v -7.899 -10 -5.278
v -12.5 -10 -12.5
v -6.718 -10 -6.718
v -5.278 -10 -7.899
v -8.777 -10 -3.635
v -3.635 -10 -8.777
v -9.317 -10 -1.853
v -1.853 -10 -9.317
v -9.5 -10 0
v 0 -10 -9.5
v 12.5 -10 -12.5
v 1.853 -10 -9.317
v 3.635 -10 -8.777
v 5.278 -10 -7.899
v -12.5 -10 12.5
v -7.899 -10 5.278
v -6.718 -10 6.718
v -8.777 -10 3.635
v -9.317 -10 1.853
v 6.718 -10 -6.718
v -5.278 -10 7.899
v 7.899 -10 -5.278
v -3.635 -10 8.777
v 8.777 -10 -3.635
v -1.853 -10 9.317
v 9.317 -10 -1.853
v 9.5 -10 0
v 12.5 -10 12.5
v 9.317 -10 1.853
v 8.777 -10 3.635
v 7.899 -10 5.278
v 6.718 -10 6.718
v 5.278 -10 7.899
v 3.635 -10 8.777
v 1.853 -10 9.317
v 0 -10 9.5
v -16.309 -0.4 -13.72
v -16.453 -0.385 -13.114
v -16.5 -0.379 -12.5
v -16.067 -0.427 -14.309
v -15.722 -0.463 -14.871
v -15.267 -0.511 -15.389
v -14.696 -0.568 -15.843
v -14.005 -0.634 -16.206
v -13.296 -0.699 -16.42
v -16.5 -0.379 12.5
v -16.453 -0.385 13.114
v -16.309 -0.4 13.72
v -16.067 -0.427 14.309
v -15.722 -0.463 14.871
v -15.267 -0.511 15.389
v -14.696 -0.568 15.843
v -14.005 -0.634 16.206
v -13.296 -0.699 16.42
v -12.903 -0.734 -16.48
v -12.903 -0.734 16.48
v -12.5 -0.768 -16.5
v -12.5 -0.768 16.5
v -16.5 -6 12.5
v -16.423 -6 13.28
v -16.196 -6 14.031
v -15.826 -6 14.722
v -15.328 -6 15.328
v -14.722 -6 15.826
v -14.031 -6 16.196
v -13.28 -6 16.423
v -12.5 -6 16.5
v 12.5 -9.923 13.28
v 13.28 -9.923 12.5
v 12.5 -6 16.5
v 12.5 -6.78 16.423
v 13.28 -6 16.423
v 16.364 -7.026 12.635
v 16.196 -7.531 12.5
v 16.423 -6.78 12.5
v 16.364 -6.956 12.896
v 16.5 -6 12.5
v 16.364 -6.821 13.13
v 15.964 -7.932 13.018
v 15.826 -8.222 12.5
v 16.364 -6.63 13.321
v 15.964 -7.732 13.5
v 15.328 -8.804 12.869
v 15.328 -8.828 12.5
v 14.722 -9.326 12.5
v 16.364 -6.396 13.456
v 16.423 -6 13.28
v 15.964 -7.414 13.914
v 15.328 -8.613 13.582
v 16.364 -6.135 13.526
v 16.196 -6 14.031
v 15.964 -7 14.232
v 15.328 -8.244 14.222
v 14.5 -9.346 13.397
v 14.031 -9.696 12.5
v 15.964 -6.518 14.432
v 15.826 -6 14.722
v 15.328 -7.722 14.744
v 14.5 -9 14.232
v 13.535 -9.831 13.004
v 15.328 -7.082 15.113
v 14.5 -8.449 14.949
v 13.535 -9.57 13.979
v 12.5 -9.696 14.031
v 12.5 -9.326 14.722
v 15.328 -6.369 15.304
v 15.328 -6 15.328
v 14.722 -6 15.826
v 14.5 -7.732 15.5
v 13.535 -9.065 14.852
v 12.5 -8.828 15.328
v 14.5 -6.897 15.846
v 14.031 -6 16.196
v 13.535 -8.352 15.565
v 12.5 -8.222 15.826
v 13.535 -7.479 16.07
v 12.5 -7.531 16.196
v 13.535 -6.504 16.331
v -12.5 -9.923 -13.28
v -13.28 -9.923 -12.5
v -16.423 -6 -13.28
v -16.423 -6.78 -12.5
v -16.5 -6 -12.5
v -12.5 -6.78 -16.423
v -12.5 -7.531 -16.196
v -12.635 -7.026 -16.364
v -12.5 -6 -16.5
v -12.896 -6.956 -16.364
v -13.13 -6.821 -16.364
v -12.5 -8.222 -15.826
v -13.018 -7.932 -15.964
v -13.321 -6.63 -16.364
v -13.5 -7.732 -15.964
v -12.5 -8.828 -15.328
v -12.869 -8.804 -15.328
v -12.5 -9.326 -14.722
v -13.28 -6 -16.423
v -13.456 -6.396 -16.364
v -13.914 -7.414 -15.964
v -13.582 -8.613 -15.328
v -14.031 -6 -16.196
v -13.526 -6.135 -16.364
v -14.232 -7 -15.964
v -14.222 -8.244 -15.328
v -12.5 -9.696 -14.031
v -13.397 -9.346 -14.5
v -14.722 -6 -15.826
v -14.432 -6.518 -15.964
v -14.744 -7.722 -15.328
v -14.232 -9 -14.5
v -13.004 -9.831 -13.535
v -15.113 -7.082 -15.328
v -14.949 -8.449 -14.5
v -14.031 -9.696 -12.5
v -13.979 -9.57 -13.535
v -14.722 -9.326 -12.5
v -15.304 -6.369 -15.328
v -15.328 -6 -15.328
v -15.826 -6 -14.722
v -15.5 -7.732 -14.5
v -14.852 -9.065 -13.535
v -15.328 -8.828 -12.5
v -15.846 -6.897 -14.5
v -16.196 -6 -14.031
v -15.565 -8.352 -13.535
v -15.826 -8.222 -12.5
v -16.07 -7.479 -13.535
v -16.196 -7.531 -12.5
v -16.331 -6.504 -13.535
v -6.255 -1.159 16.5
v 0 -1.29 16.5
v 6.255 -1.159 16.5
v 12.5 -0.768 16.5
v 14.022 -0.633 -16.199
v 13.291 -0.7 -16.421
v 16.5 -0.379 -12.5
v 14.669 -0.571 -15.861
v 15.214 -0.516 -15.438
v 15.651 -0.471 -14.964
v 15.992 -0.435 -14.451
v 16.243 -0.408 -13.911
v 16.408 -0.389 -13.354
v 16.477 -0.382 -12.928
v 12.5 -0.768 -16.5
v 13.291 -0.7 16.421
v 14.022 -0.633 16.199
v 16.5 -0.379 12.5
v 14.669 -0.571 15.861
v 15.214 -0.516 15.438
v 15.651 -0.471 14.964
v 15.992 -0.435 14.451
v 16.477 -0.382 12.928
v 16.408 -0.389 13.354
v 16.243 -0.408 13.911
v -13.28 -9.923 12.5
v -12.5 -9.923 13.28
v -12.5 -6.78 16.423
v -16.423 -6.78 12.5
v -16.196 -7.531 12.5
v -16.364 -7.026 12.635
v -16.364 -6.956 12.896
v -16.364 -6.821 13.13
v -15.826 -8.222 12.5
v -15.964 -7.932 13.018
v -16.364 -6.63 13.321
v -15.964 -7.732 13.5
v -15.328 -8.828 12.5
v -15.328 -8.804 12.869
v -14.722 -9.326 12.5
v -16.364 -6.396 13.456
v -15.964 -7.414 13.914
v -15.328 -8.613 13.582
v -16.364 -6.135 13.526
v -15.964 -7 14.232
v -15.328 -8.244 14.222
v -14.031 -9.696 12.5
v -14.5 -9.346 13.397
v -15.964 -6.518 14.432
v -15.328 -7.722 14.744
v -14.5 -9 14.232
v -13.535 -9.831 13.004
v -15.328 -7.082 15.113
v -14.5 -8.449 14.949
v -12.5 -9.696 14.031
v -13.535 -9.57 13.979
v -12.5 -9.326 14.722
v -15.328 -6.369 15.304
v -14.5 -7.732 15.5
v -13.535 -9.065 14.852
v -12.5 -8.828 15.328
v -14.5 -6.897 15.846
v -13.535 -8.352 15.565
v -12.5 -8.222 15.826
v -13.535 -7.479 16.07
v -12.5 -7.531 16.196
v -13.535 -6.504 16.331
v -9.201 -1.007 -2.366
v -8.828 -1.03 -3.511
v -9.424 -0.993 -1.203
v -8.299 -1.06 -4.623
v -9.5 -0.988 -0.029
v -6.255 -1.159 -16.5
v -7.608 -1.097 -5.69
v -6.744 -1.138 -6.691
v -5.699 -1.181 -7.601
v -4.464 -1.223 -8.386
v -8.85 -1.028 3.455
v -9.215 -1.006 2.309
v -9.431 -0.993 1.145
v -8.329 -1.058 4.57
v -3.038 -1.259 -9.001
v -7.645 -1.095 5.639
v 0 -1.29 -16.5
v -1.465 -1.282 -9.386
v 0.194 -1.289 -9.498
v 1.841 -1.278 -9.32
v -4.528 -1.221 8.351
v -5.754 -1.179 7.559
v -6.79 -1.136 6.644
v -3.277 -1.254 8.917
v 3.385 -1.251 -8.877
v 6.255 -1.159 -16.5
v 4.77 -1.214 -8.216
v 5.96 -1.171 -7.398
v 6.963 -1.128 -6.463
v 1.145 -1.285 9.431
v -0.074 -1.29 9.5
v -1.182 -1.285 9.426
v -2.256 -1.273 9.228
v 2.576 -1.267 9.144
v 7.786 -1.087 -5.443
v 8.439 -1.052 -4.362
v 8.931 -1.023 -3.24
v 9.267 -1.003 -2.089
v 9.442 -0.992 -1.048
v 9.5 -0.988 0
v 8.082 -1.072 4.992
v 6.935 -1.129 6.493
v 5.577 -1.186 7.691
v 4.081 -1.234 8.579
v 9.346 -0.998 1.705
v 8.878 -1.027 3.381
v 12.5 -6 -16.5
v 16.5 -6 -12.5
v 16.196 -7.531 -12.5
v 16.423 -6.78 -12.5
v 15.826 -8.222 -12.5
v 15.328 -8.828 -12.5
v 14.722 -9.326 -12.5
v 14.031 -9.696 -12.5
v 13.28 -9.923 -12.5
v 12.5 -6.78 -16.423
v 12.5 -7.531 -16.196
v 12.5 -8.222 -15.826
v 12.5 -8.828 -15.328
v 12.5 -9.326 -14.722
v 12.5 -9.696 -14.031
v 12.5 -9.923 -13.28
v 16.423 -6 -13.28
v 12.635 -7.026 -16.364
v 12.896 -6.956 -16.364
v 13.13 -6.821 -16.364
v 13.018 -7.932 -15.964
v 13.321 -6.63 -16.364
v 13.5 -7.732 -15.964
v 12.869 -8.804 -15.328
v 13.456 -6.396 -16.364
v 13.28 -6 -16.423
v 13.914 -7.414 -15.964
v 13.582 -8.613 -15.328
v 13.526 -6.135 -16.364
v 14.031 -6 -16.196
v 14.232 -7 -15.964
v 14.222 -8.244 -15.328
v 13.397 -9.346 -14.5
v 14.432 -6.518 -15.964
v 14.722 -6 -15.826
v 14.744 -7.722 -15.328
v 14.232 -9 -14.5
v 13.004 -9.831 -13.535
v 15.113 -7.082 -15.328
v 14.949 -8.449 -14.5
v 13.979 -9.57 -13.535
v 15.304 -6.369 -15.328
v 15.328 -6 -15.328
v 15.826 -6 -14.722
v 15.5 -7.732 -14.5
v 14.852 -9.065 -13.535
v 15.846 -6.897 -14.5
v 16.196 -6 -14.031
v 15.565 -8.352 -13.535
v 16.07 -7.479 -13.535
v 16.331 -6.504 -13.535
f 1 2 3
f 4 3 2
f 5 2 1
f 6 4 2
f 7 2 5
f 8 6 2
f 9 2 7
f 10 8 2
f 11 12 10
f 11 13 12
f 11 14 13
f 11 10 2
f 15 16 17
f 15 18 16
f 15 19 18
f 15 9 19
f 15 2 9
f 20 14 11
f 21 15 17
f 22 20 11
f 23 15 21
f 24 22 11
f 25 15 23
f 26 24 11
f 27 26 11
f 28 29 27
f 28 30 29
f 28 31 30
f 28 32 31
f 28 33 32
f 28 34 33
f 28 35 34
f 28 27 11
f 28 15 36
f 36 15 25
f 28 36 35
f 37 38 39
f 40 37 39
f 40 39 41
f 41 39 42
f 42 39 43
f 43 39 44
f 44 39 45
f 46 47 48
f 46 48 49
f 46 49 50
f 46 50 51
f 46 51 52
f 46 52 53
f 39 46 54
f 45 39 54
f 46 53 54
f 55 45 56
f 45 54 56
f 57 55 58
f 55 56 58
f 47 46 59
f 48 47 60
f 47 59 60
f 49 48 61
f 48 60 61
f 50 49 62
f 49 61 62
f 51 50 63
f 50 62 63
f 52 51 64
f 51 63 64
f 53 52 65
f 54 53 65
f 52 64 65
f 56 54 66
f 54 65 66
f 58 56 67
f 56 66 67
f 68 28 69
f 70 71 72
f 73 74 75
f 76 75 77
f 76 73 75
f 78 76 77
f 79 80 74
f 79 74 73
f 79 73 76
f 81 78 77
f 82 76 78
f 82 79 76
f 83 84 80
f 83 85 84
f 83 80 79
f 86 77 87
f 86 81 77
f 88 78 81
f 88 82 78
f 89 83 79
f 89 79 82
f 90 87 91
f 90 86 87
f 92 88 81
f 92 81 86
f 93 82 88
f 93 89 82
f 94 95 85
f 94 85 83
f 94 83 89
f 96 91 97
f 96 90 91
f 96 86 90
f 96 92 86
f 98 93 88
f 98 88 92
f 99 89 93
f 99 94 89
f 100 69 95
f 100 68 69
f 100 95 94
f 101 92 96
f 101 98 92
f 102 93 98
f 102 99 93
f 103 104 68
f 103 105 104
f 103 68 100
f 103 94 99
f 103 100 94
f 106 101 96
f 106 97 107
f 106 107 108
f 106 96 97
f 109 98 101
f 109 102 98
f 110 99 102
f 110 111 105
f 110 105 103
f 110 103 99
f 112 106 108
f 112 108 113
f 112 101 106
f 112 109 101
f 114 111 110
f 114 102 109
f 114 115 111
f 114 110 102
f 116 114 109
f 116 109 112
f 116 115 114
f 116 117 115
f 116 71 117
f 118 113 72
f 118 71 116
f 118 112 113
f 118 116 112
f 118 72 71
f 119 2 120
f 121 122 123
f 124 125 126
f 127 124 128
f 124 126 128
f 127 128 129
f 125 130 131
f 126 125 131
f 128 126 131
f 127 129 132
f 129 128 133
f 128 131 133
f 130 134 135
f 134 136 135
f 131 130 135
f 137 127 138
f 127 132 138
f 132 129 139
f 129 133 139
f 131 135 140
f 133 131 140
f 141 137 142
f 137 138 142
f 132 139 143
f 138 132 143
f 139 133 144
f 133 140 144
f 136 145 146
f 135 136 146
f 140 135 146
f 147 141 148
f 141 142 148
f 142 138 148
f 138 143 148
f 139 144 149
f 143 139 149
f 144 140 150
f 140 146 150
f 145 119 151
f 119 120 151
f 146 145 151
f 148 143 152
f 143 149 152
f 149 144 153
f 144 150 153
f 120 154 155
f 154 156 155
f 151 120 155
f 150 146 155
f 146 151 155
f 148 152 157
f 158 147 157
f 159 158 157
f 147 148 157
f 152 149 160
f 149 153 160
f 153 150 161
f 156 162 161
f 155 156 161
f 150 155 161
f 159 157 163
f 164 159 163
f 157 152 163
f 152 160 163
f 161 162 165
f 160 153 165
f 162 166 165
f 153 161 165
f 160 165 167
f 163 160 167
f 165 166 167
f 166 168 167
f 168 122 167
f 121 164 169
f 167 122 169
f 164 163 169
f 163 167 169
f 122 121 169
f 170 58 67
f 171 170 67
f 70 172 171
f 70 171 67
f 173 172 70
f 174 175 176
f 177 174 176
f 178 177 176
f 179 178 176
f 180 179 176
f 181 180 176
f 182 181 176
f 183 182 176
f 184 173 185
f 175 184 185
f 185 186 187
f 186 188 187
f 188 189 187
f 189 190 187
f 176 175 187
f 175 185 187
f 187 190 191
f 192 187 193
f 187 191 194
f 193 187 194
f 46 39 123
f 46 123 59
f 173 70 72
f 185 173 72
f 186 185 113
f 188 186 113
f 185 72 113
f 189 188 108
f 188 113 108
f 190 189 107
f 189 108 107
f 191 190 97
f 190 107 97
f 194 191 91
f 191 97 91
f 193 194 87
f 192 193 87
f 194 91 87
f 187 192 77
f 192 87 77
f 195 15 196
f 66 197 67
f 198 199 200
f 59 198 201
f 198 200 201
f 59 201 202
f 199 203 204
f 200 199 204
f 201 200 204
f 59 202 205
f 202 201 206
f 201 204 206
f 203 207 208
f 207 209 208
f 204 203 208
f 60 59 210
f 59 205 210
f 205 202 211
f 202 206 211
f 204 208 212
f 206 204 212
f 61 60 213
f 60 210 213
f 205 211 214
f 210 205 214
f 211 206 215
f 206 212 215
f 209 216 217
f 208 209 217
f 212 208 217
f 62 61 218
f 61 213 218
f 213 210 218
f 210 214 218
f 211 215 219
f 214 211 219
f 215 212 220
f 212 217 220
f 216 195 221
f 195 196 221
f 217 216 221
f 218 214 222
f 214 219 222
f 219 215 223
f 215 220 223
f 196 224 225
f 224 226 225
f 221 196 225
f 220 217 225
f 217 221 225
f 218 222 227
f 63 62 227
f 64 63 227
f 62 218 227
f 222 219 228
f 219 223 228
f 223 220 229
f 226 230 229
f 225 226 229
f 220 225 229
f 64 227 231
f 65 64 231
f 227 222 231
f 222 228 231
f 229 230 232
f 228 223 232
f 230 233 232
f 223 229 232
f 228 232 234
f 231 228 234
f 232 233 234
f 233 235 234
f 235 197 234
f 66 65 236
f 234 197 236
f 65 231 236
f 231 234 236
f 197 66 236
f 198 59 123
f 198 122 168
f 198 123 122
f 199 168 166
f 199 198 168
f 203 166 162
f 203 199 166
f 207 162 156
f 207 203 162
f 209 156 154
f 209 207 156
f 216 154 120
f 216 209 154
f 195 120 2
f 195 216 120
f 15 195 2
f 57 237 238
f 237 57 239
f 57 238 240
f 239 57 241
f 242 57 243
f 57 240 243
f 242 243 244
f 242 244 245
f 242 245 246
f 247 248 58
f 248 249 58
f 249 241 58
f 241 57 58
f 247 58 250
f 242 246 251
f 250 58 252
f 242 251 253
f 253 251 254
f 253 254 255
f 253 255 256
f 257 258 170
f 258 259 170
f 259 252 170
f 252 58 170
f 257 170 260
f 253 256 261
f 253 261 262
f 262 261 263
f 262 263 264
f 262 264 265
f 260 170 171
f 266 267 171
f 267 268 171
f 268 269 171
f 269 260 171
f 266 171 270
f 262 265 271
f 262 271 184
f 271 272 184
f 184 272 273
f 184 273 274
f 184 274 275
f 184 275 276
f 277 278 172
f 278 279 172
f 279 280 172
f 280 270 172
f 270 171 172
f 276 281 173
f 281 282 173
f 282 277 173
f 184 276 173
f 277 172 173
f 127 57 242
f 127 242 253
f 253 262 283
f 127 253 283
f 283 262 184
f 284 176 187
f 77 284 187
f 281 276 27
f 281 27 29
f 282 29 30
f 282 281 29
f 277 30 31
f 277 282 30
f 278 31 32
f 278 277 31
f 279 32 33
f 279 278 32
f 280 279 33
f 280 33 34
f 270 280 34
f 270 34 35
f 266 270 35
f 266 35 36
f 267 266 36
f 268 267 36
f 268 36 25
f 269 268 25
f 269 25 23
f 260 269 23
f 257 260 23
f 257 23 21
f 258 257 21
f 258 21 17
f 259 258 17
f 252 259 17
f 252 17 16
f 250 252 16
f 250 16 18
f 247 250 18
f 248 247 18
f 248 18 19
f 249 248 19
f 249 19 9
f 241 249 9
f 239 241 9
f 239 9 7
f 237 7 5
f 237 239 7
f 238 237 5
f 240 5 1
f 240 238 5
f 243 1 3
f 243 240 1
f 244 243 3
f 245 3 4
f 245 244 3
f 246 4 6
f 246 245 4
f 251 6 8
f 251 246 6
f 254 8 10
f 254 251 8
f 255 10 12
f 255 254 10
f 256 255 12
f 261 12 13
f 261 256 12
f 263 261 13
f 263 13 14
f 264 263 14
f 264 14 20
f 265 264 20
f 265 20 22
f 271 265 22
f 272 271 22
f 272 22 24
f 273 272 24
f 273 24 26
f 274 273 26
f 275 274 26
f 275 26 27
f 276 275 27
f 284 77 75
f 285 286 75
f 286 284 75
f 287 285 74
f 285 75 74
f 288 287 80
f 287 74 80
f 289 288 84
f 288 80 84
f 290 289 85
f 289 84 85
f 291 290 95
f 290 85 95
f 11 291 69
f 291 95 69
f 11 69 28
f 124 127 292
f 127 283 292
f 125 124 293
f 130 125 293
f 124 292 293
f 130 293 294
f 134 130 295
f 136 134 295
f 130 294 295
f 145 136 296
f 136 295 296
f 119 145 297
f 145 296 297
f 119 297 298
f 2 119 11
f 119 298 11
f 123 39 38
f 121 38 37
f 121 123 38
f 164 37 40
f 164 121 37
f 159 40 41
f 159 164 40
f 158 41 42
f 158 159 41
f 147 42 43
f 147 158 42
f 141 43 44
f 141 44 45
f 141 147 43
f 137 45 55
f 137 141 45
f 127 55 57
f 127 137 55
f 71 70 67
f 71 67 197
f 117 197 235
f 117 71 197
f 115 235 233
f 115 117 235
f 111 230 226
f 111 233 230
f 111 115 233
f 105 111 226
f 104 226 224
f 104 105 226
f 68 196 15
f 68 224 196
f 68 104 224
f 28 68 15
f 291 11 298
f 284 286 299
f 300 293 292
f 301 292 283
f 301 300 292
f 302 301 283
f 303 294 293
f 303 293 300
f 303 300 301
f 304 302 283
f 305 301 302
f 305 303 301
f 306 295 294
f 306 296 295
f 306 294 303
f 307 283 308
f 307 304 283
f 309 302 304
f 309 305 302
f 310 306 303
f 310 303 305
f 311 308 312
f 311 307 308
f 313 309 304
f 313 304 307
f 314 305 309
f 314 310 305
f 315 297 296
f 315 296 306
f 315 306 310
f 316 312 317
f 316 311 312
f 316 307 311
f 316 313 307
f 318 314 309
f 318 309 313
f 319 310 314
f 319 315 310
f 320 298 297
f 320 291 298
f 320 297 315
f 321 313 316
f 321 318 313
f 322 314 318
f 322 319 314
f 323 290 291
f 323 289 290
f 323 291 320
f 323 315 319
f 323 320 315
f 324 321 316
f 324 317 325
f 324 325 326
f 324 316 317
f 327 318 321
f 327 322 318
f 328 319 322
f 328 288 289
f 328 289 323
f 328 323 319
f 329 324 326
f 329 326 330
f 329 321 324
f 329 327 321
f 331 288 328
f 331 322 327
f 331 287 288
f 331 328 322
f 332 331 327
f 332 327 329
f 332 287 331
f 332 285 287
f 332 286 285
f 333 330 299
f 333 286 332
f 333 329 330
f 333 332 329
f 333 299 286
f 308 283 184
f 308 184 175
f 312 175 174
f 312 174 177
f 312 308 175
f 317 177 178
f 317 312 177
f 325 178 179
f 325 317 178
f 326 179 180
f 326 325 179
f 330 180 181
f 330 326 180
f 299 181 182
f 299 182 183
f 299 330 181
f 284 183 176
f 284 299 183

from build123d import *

# Parameters (mm, degrees)
F0_W     = 33
F0_H     = 33
F0_R     = 9.5
F1_DEPTH = 10
F2_R     = 4
F4_DEPTH = 500


with BuildPart() as f1:
    # F0 (on Front) → F1 (new body)
    with BuildSketch(Plane.XZ):
        Rectangle(F0_W, F0_H)
        Circle(F0_R, mode=Mode.SUBTRACT)
    extrude(amount=F1_DEPTH)

    # F2
    f2_edges = [f1.edges().sort_by_distance(p)[0] for p in [
        (0, -10, 16.5),
        (16.5, -10, 0),
        (-16.5, -10, 0),
        (0, -10, -16.5),
        (-16.5, -5, 16.5),
        (16.5, -5, 16.5),
        (16.5, -5, -16.5),
        (-16.5, -5, -16.5),
    ]]
    fillet(f2_edges, radius=F2_R)

    # F3 (on face) → F4 (cut)
    with BuildSketch(Plane.XY.offset(16.5)):
        with BuildLine():
            Line((-12.5, 0), (-12.5, -0.76783))
            ThreePointArc((-12.5, -0.76783), (0, -1.28957), (12.5, -0.76783))
            Line((12.5, -0.76783), (12.5, 0))
            Line((12.5, 0), (-12.5, 0))
        make_face()
        with BuildLine():
            ThreePointArc((12.5, -0.76783), (110.397011, 47.15995), (150, 148.71043))
            ThreePointArc((150, 148.71043), (-101.55048, 259.10744), (-12.5, -0.76783))
            Line((-12.5, -0.76783), (-12.5, 0))
            Line((-12.5, 0), (12.5, 0))
            Line((12.5, 0), (12.5, -0.76783))
        make_face()
    extrude(amount=-F4_DEPTH, mode=Mode.SUBTRACT)


solid = f1.part
